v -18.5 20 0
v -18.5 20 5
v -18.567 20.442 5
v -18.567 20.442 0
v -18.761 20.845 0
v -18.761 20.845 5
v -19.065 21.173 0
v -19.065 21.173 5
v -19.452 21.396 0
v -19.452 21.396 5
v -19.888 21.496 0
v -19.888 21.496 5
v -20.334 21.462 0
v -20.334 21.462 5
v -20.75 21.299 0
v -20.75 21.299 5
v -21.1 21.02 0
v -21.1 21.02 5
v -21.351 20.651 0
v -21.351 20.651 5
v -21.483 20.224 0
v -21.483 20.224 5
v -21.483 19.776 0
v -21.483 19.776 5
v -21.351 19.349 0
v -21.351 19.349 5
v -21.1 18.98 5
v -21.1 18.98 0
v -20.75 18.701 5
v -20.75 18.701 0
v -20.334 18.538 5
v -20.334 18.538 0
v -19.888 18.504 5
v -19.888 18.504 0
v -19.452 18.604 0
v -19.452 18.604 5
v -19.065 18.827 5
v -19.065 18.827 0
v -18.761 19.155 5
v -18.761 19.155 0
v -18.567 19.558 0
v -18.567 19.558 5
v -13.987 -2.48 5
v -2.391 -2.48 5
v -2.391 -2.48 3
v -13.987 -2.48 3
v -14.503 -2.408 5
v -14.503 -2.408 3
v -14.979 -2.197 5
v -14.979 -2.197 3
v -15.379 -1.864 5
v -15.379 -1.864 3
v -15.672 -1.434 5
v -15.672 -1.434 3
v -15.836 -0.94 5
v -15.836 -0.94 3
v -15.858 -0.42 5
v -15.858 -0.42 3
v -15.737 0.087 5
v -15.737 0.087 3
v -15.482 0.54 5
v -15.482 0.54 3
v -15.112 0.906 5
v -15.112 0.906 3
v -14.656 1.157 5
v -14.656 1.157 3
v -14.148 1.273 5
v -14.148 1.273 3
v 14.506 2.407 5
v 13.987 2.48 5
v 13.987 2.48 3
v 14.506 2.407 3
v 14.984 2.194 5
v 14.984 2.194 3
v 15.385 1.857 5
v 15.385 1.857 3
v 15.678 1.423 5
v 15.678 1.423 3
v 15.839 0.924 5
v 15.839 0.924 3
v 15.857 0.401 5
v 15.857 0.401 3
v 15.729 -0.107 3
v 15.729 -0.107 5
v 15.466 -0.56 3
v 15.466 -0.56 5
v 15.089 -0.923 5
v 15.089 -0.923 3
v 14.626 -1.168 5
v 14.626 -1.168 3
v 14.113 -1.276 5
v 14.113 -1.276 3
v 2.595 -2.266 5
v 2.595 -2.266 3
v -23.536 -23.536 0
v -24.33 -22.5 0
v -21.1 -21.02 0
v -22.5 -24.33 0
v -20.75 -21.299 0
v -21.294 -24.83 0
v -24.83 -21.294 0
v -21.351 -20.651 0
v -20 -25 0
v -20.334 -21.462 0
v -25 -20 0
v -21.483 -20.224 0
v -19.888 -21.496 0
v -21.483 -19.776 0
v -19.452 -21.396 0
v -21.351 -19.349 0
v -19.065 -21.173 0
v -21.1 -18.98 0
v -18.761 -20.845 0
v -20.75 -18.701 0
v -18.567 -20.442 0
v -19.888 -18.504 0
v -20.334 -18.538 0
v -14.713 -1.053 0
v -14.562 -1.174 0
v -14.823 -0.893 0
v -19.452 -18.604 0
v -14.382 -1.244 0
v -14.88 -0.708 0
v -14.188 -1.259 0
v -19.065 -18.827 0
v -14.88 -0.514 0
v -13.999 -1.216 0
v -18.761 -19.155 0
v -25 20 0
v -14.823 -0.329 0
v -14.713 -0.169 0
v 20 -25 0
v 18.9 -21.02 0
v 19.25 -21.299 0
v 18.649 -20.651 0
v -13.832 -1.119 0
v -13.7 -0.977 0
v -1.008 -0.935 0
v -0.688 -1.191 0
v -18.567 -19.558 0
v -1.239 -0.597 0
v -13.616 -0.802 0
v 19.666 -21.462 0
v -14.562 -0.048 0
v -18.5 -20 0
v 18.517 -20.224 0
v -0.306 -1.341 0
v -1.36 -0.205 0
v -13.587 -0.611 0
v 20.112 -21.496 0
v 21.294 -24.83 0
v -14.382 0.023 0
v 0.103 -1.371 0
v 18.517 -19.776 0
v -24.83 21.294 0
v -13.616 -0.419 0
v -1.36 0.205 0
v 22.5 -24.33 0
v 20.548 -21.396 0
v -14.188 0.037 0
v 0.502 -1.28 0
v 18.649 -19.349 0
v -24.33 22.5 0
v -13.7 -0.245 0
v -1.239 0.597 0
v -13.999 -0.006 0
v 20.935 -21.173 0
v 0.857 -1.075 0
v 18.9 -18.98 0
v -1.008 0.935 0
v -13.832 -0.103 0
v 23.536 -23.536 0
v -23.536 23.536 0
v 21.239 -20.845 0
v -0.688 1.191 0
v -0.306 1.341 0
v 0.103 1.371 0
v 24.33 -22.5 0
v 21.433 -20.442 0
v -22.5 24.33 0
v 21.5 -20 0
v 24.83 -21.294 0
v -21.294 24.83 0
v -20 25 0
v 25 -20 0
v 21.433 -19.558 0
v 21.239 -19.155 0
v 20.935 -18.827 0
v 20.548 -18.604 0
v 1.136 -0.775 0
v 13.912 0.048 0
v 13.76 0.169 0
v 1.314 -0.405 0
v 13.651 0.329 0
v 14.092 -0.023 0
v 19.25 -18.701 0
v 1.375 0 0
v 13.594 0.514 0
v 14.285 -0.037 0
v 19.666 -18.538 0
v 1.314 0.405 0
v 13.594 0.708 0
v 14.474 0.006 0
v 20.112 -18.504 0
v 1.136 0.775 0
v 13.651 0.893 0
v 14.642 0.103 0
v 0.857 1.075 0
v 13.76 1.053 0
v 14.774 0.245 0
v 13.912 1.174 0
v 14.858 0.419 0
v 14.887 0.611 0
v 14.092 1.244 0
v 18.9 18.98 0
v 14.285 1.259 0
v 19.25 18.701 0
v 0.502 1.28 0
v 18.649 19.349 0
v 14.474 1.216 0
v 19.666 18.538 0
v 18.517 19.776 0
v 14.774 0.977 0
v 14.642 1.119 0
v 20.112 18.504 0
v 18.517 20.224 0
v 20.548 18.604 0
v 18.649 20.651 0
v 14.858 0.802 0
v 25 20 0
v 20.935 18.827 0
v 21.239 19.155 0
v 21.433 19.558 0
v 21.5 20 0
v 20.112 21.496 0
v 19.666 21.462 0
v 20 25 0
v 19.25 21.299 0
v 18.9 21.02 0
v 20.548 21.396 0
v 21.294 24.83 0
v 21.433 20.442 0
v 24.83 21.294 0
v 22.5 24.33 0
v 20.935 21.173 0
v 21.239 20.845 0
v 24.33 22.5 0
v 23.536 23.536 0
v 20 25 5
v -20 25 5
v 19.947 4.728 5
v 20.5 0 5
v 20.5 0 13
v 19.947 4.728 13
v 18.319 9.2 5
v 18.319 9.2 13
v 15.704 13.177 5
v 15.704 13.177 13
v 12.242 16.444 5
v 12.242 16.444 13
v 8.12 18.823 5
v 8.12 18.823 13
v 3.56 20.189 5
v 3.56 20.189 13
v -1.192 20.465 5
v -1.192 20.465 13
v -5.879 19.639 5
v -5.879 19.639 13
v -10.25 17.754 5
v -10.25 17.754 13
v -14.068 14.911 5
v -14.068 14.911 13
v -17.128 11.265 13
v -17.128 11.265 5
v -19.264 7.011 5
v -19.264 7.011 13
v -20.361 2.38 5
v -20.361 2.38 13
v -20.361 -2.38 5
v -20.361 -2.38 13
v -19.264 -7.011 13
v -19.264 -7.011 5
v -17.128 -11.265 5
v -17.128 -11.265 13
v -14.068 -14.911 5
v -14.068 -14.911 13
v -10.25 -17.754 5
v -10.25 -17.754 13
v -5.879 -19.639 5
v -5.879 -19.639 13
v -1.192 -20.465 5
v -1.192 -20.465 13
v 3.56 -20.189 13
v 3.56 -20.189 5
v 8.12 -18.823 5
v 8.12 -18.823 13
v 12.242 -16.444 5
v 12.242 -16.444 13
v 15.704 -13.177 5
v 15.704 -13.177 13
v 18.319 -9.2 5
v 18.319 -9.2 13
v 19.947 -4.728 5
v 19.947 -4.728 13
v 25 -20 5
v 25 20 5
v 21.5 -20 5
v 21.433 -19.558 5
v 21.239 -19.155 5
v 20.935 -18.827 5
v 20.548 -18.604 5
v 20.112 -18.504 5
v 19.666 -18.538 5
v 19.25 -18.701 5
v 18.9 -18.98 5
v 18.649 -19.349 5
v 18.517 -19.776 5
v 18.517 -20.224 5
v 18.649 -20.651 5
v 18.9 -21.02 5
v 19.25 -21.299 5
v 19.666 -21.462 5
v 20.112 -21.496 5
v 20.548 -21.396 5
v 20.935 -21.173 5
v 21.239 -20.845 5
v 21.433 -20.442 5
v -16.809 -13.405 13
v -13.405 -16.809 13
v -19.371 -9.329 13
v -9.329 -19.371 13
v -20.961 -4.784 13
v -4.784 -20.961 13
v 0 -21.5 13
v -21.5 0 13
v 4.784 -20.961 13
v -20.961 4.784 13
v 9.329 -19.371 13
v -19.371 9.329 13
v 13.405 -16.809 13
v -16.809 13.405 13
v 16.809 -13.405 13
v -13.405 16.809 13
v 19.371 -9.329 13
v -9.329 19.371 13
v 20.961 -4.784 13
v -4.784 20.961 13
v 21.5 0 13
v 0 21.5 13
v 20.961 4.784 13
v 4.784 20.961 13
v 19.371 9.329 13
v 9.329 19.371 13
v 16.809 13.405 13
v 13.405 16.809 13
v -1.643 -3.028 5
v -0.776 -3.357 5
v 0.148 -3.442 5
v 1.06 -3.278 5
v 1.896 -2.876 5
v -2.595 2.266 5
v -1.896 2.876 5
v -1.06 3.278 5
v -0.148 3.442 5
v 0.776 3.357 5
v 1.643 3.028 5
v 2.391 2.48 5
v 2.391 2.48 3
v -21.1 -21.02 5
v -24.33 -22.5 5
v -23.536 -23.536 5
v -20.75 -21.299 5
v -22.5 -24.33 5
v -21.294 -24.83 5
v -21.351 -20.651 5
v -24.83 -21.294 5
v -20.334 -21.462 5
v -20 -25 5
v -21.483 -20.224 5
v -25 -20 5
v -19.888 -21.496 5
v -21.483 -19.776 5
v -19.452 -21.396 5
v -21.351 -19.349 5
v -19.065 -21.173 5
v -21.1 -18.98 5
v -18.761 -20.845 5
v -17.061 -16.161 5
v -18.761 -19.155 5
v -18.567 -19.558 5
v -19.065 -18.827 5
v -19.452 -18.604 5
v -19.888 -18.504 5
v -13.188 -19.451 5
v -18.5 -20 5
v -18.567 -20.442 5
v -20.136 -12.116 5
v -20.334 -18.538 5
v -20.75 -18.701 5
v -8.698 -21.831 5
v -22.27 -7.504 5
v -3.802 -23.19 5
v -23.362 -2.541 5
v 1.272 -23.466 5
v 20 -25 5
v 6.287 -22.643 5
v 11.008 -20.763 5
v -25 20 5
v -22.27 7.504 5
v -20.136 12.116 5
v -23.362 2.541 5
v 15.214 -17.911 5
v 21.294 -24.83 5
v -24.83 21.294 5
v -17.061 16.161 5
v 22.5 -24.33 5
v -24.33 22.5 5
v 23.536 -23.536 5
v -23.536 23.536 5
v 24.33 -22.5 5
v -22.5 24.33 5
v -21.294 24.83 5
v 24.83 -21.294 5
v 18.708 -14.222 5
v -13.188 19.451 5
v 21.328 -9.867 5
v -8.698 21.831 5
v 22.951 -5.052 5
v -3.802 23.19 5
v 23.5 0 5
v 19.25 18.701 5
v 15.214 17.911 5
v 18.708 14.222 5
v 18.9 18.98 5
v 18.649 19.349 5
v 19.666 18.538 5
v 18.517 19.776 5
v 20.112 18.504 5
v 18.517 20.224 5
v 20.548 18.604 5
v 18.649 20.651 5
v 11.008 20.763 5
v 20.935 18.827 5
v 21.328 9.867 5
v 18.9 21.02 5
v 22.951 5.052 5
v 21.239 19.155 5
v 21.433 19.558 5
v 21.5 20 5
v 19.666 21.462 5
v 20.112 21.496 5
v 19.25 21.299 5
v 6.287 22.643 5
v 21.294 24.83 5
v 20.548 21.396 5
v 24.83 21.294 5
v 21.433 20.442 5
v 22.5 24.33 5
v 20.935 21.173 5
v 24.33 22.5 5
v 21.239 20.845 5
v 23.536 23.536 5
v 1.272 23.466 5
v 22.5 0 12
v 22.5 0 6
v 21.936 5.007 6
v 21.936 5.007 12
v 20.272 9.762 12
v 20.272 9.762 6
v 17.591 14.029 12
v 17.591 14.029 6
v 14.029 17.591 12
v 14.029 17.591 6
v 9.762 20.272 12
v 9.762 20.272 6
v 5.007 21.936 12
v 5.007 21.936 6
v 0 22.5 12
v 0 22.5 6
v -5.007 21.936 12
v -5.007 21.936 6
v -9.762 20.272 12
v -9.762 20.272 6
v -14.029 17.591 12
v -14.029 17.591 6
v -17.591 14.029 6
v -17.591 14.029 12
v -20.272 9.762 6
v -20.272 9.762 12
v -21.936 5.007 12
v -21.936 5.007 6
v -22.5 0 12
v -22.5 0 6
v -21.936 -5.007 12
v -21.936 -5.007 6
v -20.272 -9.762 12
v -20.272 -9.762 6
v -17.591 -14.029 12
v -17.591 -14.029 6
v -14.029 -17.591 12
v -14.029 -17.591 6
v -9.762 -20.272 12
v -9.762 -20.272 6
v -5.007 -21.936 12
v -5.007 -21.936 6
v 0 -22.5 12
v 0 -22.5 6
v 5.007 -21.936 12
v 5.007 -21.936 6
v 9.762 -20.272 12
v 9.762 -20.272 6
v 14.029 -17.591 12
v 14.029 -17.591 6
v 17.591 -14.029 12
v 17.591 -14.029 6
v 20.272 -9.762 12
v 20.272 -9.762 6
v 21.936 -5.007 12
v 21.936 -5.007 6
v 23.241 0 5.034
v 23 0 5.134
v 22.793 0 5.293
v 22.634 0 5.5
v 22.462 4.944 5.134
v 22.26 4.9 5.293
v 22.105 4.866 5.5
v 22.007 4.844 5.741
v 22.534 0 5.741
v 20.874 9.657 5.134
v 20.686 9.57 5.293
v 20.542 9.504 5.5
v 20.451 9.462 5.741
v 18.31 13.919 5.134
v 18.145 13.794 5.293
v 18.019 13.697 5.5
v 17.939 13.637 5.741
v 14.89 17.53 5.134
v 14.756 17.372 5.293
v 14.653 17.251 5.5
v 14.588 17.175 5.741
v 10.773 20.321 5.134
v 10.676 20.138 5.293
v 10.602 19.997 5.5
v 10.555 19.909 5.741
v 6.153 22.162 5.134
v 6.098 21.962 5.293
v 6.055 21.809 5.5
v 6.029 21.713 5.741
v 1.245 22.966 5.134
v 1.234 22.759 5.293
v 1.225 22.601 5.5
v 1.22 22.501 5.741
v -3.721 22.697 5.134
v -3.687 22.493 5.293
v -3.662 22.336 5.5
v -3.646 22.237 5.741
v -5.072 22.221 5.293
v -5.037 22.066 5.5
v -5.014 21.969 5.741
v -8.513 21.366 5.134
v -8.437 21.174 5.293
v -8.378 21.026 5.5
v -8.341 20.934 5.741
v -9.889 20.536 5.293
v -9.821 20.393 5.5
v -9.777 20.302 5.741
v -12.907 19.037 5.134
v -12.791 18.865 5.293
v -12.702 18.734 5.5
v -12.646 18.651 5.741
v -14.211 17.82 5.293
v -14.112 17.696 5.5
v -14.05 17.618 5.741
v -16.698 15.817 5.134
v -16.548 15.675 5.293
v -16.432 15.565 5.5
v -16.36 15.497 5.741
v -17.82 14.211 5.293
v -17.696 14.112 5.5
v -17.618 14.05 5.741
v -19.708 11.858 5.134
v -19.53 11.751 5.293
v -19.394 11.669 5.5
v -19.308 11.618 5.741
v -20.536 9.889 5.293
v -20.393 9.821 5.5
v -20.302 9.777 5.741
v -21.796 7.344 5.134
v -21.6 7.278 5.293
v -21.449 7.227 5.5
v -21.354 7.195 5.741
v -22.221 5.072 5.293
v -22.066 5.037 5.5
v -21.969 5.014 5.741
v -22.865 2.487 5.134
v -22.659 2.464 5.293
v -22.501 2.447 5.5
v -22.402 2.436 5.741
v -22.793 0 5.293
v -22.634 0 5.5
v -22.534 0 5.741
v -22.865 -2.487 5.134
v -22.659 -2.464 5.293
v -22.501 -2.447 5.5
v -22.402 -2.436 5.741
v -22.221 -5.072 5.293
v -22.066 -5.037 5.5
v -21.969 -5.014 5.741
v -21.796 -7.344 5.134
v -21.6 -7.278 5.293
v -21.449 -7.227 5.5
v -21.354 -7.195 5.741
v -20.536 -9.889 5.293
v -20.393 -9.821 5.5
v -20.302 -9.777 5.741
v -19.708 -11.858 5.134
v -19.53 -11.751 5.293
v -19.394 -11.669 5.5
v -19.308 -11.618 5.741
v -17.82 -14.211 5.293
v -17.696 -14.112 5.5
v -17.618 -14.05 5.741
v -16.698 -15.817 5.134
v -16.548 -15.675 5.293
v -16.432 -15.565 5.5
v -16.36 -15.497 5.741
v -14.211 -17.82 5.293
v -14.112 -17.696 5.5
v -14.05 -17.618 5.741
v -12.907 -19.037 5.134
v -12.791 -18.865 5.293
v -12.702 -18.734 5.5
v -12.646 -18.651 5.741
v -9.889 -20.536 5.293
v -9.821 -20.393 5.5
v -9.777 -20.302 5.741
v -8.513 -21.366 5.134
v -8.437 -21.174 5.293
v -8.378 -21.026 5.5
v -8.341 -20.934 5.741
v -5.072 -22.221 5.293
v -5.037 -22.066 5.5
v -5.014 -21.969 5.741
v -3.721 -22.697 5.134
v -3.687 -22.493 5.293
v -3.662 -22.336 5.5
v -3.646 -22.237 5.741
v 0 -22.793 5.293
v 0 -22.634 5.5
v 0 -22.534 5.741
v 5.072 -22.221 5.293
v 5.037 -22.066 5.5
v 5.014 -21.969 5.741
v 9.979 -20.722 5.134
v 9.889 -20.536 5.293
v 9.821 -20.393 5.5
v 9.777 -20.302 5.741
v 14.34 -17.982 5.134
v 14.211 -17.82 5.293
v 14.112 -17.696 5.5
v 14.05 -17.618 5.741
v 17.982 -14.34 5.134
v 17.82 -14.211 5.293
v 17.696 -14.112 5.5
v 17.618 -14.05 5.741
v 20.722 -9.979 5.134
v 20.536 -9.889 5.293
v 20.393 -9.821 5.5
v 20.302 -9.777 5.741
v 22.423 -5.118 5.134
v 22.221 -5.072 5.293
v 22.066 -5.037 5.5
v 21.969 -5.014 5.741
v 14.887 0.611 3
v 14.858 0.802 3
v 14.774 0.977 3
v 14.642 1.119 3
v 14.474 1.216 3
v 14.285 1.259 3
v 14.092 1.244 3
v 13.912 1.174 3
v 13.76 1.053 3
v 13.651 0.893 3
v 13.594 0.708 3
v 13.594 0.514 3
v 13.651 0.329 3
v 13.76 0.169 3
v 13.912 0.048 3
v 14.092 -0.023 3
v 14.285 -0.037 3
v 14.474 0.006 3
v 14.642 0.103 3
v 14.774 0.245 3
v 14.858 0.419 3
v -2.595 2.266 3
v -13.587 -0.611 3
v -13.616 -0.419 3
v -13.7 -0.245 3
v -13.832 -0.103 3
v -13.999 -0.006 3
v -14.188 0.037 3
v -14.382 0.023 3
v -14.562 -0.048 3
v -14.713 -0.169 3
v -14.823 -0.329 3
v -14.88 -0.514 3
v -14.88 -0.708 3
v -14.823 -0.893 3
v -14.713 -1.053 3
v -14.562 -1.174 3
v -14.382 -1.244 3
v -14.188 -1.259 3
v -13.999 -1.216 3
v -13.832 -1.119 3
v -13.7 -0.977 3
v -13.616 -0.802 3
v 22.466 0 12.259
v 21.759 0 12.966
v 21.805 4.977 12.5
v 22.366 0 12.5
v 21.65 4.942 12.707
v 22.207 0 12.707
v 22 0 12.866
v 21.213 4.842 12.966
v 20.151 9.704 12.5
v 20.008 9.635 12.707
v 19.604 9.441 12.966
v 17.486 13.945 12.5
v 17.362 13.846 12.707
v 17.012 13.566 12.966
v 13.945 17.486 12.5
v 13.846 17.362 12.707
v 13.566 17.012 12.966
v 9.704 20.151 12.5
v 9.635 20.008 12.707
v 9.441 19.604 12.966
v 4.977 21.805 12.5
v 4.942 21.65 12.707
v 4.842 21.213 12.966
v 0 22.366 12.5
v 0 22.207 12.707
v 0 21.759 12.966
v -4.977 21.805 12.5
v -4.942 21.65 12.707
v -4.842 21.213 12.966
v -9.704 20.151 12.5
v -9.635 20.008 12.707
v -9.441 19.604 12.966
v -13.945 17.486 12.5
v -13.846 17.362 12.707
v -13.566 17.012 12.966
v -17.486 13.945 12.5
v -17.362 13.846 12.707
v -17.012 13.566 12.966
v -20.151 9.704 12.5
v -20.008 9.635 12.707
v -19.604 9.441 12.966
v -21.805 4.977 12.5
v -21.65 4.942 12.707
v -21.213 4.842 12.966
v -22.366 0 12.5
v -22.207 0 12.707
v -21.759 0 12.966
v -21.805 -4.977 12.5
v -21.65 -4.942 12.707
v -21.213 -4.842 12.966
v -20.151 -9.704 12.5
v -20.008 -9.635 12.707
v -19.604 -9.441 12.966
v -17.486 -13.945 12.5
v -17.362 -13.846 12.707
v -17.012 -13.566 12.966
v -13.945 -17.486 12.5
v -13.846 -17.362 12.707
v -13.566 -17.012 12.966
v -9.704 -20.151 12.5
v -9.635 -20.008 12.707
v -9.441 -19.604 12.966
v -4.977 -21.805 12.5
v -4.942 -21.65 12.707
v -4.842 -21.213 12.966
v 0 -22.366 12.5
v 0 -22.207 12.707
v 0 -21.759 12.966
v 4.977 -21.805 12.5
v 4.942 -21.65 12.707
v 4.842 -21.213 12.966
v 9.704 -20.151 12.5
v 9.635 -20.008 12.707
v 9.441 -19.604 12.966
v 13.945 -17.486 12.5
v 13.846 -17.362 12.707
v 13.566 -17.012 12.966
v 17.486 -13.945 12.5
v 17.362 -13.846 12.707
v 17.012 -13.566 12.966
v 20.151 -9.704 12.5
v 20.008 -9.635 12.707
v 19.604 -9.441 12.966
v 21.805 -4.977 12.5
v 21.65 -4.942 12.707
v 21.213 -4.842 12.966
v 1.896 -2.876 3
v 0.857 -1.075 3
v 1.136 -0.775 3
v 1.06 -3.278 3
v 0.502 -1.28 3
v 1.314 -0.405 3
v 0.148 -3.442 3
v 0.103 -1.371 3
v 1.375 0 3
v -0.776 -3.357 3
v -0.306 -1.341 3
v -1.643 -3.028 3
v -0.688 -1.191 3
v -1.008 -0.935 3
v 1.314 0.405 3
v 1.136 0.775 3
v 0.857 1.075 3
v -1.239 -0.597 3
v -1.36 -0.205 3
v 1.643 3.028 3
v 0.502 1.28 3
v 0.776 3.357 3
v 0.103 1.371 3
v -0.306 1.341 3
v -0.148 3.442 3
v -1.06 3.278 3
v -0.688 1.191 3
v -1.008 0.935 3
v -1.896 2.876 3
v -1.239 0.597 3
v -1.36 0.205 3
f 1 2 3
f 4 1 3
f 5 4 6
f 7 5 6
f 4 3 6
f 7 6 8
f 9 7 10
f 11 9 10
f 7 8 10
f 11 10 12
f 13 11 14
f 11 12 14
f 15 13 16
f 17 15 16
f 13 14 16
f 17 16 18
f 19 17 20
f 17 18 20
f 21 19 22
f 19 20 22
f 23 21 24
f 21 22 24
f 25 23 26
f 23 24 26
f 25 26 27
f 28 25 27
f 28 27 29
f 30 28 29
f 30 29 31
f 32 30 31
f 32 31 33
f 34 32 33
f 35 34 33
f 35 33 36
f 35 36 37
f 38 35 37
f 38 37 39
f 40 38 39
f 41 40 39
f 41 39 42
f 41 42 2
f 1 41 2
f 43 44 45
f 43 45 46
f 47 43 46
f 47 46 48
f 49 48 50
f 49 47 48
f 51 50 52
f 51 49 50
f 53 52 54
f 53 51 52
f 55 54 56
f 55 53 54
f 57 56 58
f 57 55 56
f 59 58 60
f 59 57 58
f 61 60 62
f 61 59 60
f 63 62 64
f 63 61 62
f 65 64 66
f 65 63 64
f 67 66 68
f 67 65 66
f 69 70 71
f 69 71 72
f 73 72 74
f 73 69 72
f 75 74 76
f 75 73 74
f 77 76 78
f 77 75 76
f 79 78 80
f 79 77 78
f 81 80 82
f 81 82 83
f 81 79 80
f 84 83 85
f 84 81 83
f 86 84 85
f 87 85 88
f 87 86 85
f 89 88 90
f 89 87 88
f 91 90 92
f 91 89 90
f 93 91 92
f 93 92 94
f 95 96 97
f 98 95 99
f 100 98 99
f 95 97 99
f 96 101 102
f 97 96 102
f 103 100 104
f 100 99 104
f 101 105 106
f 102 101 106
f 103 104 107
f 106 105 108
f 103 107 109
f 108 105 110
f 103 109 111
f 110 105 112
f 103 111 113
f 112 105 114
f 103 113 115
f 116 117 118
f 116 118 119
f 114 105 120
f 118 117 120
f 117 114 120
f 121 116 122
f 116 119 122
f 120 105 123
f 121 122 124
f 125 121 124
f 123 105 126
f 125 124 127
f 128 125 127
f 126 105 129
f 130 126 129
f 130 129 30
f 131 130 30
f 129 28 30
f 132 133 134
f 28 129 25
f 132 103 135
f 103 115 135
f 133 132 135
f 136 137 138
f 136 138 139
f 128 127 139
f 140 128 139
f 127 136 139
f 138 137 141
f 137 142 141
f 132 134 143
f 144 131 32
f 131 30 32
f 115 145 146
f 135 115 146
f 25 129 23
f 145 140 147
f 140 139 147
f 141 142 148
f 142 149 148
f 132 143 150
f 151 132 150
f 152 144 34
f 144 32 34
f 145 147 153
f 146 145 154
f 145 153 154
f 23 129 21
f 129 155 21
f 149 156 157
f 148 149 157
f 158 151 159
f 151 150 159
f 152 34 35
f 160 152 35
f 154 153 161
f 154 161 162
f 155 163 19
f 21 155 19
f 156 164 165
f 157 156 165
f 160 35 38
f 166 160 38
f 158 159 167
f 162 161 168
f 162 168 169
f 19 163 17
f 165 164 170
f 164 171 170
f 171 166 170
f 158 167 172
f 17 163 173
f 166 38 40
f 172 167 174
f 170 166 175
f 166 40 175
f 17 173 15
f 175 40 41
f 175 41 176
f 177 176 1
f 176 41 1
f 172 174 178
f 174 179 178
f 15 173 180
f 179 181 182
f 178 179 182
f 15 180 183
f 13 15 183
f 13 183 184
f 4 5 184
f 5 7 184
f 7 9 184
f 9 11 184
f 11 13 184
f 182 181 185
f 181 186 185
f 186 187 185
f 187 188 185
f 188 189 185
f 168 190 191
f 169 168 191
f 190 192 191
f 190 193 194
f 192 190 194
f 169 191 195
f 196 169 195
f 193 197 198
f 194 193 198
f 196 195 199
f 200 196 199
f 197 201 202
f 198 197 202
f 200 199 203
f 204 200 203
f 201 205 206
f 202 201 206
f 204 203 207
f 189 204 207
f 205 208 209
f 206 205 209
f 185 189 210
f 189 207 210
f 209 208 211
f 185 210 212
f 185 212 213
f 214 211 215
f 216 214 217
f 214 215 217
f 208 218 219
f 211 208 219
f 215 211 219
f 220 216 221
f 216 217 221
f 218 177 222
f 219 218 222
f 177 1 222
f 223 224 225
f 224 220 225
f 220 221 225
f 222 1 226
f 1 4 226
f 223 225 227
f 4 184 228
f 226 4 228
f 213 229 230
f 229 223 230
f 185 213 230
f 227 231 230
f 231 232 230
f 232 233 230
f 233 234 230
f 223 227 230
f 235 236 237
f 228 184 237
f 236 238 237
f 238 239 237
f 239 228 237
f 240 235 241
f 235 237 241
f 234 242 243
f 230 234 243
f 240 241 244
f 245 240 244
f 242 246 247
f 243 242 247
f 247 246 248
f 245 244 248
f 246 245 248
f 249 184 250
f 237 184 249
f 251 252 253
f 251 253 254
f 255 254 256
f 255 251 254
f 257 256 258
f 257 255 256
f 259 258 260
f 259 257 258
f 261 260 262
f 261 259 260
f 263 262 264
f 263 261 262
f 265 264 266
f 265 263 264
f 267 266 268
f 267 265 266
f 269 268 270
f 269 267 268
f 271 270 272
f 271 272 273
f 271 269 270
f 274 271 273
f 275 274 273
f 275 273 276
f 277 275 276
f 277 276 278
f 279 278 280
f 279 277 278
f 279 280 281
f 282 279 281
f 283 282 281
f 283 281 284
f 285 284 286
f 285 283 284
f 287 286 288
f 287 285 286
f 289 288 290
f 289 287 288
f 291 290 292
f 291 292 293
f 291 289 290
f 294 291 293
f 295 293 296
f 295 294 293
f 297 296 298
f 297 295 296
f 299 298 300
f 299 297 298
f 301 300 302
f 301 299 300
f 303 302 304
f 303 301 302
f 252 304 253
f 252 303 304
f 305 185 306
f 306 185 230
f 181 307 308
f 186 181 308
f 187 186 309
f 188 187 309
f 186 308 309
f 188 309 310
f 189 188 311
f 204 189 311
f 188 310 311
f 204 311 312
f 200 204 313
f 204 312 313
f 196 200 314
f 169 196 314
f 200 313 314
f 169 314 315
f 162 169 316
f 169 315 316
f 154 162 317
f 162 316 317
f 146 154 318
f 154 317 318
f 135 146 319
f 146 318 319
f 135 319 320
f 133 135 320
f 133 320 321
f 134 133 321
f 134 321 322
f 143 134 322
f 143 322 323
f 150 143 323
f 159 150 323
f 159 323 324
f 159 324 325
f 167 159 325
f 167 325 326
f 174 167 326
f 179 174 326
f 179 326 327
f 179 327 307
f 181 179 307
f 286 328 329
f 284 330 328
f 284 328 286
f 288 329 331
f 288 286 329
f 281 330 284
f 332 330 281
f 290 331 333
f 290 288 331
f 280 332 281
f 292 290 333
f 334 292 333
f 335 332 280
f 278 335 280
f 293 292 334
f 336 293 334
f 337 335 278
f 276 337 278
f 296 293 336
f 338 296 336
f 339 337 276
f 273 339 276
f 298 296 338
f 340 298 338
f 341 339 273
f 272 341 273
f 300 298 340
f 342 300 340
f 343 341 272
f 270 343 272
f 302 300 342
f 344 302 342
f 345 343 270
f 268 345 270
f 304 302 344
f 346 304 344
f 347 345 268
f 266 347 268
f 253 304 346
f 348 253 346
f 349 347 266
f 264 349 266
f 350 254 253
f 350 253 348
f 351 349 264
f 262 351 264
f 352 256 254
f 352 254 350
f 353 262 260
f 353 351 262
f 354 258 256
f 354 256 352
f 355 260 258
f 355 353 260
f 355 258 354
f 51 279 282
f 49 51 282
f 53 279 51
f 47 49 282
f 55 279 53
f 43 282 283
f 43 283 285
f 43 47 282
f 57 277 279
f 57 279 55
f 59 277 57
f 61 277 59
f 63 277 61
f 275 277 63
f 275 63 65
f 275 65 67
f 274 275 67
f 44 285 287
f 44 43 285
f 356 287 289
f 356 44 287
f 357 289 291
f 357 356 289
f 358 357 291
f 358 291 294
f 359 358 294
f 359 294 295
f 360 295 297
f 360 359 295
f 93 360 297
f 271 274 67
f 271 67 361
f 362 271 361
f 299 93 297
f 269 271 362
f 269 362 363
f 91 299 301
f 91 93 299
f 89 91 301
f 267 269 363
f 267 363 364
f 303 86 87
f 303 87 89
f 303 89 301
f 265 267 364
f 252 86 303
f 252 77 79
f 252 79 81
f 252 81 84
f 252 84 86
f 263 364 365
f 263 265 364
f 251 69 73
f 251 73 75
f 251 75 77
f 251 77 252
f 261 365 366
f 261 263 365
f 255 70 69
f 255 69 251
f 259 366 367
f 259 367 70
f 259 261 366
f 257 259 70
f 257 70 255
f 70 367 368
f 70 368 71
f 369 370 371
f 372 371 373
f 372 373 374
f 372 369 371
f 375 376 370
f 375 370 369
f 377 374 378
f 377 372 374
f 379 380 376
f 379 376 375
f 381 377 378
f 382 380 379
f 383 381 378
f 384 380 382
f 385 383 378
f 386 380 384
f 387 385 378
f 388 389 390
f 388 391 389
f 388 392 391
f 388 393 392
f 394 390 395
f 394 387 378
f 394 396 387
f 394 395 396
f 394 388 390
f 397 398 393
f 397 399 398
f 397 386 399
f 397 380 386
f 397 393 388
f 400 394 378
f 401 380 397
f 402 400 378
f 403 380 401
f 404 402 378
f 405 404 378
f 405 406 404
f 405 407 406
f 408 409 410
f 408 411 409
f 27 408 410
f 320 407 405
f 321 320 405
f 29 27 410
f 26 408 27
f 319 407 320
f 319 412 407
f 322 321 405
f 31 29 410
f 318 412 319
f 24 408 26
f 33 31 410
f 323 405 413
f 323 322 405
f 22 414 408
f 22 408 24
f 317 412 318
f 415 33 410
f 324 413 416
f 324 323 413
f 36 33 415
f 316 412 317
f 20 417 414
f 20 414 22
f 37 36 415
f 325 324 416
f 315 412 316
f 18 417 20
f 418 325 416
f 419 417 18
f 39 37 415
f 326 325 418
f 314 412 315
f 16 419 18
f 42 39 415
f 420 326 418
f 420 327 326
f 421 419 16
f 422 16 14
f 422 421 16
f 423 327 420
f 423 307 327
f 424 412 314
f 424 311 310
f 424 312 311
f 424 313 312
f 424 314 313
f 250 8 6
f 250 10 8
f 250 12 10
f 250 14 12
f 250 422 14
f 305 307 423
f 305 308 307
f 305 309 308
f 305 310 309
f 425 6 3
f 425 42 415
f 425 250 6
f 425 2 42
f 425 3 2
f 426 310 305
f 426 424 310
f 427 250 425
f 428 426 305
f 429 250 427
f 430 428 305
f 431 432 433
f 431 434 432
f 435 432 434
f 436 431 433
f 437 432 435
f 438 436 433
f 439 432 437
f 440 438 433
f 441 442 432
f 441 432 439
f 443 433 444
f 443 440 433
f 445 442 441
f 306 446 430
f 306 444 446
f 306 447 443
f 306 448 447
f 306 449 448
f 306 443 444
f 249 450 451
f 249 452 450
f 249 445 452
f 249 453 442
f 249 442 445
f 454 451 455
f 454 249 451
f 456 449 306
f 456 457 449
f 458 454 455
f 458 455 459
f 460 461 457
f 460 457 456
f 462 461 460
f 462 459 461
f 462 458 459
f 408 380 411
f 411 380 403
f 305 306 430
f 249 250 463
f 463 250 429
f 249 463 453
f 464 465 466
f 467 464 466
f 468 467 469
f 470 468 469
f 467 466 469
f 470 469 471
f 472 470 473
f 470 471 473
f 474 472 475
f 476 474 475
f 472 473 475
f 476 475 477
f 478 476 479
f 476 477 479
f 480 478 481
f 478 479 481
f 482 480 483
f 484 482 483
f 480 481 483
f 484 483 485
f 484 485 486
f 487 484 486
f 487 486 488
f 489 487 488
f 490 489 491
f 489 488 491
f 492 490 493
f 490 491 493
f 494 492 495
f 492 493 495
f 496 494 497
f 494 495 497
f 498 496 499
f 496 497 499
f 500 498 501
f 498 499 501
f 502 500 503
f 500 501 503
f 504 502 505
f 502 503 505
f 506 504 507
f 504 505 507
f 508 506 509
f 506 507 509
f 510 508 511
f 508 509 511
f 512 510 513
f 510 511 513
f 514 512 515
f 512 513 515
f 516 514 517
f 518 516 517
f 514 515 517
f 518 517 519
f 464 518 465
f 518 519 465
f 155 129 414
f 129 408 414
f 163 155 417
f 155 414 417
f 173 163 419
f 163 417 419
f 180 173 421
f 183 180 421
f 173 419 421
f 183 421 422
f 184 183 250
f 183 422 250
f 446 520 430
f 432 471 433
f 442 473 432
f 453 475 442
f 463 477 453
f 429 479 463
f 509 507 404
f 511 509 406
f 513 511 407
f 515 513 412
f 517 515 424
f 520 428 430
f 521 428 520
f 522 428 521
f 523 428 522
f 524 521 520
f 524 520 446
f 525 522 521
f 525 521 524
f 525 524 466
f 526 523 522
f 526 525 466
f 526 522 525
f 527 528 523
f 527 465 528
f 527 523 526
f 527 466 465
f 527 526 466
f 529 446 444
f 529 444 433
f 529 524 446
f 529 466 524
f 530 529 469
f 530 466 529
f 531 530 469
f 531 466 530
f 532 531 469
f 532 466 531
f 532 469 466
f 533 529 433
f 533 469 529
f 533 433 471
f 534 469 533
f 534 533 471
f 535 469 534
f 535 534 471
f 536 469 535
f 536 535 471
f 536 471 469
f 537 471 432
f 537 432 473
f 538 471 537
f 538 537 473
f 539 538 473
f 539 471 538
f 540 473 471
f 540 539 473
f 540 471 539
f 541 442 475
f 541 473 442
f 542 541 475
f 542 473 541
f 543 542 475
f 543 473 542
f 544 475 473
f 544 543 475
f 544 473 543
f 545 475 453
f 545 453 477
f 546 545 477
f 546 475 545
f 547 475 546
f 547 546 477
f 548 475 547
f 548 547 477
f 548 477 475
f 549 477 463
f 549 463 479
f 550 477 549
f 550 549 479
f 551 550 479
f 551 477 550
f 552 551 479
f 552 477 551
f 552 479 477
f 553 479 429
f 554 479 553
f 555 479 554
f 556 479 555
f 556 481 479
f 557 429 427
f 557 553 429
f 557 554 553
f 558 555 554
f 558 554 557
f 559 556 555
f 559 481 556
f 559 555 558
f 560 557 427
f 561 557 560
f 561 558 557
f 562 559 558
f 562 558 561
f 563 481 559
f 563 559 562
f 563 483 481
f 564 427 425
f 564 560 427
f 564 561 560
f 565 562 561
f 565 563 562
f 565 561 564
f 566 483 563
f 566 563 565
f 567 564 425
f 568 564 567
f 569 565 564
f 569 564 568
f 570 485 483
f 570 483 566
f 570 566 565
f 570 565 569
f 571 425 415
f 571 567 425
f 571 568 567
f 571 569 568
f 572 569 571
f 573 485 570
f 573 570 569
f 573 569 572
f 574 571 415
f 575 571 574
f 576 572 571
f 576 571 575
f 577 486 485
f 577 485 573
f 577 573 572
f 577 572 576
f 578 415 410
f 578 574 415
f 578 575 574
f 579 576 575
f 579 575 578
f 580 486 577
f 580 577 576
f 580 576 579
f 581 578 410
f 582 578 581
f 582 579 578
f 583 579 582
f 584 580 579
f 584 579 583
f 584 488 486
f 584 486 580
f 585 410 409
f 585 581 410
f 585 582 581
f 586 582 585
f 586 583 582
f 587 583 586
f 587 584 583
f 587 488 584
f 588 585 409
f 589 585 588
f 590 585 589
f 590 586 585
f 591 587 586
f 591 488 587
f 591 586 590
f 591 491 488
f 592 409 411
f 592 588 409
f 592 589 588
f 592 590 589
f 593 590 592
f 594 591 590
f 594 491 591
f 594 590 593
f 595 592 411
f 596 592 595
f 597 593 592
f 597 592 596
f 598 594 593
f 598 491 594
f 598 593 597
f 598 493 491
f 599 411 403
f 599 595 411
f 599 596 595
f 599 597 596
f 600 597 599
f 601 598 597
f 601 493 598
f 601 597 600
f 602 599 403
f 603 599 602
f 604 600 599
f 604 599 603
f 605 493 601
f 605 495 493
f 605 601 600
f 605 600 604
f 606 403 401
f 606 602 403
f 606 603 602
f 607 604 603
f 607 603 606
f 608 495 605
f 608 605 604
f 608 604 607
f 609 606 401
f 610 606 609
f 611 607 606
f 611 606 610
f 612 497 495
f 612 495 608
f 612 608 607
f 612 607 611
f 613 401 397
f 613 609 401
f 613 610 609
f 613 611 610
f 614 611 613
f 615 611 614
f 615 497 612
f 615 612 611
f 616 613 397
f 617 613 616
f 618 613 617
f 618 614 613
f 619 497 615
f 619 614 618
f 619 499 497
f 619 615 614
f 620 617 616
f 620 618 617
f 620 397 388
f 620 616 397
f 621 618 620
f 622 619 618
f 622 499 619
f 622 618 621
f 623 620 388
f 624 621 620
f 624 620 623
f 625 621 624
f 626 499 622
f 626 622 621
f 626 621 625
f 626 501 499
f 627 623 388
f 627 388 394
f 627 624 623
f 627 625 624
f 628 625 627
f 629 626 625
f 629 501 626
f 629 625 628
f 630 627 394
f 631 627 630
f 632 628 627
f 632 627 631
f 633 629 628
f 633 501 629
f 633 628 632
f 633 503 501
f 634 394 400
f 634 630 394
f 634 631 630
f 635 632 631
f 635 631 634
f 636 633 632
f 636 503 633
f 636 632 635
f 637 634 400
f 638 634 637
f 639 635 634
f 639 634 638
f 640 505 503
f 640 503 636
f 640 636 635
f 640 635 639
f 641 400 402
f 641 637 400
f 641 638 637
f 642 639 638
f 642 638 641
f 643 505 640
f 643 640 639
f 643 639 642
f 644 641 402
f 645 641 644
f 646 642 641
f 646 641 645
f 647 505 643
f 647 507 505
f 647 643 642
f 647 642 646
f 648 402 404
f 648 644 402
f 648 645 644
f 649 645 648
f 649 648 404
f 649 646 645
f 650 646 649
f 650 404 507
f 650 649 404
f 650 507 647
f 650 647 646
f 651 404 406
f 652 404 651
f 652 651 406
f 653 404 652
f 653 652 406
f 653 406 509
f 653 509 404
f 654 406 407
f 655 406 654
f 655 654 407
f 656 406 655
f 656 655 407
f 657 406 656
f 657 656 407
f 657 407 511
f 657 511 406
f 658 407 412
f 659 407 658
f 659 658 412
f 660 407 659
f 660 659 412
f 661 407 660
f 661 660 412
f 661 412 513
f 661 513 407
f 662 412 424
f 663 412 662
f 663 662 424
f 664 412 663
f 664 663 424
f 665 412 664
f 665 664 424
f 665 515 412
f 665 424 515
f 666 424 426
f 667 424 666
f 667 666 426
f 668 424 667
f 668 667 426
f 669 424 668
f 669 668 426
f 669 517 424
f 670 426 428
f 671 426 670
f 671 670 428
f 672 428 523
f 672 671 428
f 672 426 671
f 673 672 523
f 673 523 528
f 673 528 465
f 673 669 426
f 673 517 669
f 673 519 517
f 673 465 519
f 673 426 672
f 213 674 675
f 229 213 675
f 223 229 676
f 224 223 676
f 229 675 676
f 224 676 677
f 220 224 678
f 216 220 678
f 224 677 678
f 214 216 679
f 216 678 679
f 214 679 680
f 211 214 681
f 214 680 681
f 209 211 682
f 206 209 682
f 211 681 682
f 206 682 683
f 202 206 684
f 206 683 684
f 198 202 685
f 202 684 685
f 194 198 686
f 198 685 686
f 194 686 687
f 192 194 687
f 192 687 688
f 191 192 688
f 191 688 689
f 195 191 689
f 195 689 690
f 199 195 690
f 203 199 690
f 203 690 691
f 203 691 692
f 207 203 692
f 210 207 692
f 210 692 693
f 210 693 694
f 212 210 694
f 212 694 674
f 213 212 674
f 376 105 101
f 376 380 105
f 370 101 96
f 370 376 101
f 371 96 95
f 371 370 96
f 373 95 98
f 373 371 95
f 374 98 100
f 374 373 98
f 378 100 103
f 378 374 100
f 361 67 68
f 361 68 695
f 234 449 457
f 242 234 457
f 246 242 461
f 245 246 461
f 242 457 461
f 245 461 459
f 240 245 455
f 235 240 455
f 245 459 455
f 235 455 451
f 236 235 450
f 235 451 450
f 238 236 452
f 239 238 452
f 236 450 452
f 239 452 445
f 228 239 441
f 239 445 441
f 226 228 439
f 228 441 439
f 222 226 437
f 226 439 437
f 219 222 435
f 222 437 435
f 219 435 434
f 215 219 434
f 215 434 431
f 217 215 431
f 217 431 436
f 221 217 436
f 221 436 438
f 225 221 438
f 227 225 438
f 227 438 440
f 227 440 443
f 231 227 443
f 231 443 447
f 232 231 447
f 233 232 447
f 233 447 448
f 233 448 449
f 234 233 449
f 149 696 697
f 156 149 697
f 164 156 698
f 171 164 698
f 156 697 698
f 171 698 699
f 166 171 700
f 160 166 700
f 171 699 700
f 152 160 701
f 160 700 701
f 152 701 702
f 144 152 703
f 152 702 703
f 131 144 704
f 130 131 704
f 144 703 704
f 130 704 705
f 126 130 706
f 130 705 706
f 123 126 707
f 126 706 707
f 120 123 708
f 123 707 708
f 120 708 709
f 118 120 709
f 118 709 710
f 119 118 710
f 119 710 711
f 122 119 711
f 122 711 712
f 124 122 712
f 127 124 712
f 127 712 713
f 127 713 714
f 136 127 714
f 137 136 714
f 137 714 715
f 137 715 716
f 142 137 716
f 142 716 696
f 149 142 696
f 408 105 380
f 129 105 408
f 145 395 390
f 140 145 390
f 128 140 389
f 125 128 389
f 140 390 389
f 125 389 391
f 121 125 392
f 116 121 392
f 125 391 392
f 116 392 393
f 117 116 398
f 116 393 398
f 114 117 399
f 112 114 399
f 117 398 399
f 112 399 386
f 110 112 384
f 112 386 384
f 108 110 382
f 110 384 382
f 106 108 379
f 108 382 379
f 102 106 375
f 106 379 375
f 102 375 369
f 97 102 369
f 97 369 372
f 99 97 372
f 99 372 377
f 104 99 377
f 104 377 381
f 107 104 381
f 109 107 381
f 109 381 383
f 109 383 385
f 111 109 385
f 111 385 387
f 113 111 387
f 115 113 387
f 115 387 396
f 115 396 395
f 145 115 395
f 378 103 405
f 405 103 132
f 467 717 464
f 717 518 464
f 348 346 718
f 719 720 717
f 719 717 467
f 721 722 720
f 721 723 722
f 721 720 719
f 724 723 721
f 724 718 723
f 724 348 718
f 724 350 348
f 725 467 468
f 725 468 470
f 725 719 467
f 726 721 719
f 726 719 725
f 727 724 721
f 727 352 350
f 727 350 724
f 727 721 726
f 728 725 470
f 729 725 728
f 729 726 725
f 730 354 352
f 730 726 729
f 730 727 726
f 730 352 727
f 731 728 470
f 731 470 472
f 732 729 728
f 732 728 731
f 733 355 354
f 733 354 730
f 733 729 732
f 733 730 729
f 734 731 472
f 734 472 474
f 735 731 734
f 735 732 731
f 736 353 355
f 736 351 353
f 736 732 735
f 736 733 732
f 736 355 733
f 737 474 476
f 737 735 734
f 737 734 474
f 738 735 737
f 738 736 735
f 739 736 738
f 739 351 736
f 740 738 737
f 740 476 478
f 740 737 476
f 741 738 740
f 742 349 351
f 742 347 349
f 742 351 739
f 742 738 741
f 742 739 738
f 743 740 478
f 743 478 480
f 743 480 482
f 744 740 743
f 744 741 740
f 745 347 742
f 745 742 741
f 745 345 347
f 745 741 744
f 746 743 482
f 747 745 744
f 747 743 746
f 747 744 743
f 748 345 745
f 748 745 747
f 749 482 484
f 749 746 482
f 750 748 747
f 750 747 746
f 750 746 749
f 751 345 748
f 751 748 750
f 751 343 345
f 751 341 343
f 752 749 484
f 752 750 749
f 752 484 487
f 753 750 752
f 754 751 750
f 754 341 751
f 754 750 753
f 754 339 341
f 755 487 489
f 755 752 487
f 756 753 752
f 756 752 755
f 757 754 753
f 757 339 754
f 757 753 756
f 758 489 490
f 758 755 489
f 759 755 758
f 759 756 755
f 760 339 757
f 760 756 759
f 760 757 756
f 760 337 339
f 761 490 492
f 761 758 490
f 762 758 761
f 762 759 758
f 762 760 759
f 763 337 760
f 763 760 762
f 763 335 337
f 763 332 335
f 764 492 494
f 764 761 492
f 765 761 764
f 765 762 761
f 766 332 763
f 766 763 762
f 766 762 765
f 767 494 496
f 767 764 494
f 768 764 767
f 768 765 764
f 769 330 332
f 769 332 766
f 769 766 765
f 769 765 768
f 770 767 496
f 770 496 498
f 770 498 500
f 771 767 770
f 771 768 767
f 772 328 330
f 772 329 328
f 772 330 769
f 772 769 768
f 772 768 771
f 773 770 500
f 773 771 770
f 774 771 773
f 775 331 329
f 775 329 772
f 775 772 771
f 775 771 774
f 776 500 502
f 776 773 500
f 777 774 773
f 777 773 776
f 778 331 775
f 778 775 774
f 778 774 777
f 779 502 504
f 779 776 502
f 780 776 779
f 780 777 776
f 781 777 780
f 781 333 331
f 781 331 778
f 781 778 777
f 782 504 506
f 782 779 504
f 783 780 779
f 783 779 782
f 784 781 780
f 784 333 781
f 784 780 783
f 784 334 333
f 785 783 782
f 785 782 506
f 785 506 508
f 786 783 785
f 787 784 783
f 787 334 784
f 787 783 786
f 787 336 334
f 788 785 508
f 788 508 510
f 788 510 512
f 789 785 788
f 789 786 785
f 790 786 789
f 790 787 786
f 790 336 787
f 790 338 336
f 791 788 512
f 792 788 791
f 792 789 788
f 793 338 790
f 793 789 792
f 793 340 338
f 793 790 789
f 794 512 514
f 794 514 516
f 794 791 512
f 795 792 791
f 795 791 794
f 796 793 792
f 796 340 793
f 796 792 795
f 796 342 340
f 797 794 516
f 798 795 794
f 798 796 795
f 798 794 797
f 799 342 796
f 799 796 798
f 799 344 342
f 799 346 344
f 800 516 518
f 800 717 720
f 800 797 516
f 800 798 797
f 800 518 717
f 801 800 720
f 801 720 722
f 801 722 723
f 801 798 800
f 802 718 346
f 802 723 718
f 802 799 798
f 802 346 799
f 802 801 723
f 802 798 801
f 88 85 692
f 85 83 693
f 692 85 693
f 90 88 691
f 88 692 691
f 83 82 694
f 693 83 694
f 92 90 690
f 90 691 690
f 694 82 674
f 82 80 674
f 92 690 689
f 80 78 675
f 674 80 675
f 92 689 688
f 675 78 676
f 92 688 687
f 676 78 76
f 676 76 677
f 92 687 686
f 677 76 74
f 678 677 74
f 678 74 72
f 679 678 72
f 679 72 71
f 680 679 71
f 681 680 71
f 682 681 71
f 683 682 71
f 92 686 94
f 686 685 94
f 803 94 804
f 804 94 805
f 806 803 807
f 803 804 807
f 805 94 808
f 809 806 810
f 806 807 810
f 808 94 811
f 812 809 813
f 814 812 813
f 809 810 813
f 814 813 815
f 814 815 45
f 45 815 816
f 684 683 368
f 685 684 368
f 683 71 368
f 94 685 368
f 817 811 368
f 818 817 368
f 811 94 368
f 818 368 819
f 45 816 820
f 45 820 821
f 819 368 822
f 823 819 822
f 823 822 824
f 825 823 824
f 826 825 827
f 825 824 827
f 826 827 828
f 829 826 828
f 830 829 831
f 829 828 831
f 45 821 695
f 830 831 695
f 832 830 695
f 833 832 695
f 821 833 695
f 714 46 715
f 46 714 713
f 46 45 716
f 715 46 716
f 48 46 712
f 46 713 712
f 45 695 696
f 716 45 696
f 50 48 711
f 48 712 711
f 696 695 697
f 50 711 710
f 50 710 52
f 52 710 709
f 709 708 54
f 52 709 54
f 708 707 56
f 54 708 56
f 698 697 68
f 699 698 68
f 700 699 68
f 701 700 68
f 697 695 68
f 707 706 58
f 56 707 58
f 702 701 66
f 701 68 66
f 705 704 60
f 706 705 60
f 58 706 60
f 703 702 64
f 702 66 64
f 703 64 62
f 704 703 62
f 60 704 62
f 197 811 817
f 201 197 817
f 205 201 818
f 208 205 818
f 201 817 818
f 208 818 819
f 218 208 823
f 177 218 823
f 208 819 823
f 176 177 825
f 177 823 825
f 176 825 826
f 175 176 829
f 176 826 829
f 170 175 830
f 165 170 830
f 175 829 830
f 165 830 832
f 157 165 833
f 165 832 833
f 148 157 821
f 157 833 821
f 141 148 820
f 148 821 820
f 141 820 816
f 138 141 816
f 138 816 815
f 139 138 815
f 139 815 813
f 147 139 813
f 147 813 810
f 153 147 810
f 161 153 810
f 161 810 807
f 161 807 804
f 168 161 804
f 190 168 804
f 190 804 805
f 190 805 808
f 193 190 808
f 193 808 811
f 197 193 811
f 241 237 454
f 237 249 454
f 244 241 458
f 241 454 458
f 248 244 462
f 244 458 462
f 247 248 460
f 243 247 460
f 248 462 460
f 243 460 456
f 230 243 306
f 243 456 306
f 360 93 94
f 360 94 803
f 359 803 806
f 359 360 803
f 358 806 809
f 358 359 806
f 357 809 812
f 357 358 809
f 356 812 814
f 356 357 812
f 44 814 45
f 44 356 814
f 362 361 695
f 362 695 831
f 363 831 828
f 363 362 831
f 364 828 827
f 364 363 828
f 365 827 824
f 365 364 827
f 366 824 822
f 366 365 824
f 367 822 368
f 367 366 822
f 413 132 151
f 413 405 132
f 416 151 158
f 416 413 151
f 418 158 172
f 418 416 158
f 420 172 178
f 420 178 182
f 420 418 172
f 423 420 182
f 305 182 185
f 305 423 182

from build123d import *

# Parameters (mm, degrees)
ESQUISSE1_W             = 50
ESQUISSE1_H             = 50
BOSS_EXTRU_3_DEPTH      = 5
ESQUISSE3_R             = 22.5
ESQUISSE3_R_2           = 20.5
BOSS_EXTRU_4_DEPTH      = 8
ENL_V_MAT_EXTRU_1_DEPTH = 2
ESQUISSE5_R             = 0.65
ESQUISSE5_R_2           = 1.375
ENL_V_MAT_EXTRU_2_DEPTH = 37.742346142
CONG_1_R                = 5
ESQUISSE6_R             = 1.5
ENL_V_MAT_EXTRU_3_DEPTH = 37.249137921
CONG_2_R                = 1
CONG_3_R                = 1


with BuildPart() as part:
    # Esquisse1 → Boss.-Extru.3 (new body)
    with BuildSketch(Plane.XY):
        Rectangle(ESQUISSE1_W, ESQUISSE1_H)
    extrude(amount=BOSS_EXTRU_3_DEPTH)

    # Esquisse3 → Boss.-Extru.4 (add)
    with BuildSketch(Plane.XY.offset(5)):
        Circle(ESQUISSE3_R)
        Circle(ESQUISSE3_R_2, mode=Mode.SUBTRACT)
    extrude(amount=BOSS_EXTRU_4_DEPTH)

    # Esquisse4 → Enlèv. mat.-Extru.1 (cut)
    with BuildSketch(Plane.XY.offset(5)):
        with BuildLine():
            Line((-14.148131749, 1.273093878), (-2.594747862, 2.266121915))
            ThreePointArc((-2.594747862, 2.266121915), (-0.147642857, 3.44183477), (2.391155578, 2.48))
            Line((2.391155578, 2.48), (13.987136948, 2.48))
            ThreePointArc((13.987136948, 2.48), (15.866074919, 0.663183078), (14.113431719, -1.275753084))
            Line((14.113431719, -1.275753084), (2.594747862, -2.266121915))
            ThreePointArc((2.594747862, -2.266121915), (0.147642857, -3.44183477), (-2.391155578, -2.48))
            Line((-2.391155578, -2.48), (-13.987136948, -2.48))
            ThreePointArc((-13.987136948, -2.48), (-15.865409624, -0.680571429), (-14.148131749, 1.273093878))
        make_face()
    extrude(amount=-ENL_V_MAT_EXTRU_1_DEPTH, mode=Mode.SUBTRACT)

    # Esquisse5 → Enlèv. mat.-Extru.2 (cut, through all)
    with BuildSketch(Plane.XY.offset(3)):
        with Locations((-14.236907251, -0.610714286)):
            Circle(ESQUISSE5_R)
        with Locations((14.236907251, 0.610714286)):
            Circle(ESQUISSE5_R)
        Circle(ESQUISSE5_R_2)
    extrude(amount=-ENL_V_MAT_EXTRU_2_DEPTH, mode=Mode.SUBTRACT)

    # Congé1
    cong_1_edges = [part.edges().sort_by_distance(p)[0] for p in [
        (25, -25, 2.5),
        (-25, -25, 2.5),
        (-25, 25, 2.5),
        (25, 25, 2.5),
    ]]
    fillet(cong_1_edges, radius=CONG_1_R)

    # Esquisse6 → Enlèv. mat.-Extru.3 (cut, through all)
    with BuildSketch(Plane.XY.offset(5)):
        with Locations((-20, -20)):
            Circle(ESQUISSE6_R)
        with Locations((20, -20)):
            Circle(ESQUISSE6_R)
        with Locations((20, 20)):
            Circle(ESQUISSE6_R)
        with Locations((-20, 20)):
            Circle(ESQUISSE6_R)
    extrude(amount=-ENL_V_MAT_EXTRU_3_DEPTH, mode=Mode.SUBTRACT)

    # Congé2
    cong_2_edges = [part.edges().sort_by_distance(p)[0] for p in [
        (-22.5, 0, 5),
    ]]
    fillet(cong_2_edges, radius=CONG_2_R)

    # Congé3
    cong_3_edges = [part.edges().sort_by_distance(p)[0] for p in [
        (-22.5, 0, 13),
    ]]
    fillet(cong_3_edges, radius=CONG_3_R)


solid = part.part
